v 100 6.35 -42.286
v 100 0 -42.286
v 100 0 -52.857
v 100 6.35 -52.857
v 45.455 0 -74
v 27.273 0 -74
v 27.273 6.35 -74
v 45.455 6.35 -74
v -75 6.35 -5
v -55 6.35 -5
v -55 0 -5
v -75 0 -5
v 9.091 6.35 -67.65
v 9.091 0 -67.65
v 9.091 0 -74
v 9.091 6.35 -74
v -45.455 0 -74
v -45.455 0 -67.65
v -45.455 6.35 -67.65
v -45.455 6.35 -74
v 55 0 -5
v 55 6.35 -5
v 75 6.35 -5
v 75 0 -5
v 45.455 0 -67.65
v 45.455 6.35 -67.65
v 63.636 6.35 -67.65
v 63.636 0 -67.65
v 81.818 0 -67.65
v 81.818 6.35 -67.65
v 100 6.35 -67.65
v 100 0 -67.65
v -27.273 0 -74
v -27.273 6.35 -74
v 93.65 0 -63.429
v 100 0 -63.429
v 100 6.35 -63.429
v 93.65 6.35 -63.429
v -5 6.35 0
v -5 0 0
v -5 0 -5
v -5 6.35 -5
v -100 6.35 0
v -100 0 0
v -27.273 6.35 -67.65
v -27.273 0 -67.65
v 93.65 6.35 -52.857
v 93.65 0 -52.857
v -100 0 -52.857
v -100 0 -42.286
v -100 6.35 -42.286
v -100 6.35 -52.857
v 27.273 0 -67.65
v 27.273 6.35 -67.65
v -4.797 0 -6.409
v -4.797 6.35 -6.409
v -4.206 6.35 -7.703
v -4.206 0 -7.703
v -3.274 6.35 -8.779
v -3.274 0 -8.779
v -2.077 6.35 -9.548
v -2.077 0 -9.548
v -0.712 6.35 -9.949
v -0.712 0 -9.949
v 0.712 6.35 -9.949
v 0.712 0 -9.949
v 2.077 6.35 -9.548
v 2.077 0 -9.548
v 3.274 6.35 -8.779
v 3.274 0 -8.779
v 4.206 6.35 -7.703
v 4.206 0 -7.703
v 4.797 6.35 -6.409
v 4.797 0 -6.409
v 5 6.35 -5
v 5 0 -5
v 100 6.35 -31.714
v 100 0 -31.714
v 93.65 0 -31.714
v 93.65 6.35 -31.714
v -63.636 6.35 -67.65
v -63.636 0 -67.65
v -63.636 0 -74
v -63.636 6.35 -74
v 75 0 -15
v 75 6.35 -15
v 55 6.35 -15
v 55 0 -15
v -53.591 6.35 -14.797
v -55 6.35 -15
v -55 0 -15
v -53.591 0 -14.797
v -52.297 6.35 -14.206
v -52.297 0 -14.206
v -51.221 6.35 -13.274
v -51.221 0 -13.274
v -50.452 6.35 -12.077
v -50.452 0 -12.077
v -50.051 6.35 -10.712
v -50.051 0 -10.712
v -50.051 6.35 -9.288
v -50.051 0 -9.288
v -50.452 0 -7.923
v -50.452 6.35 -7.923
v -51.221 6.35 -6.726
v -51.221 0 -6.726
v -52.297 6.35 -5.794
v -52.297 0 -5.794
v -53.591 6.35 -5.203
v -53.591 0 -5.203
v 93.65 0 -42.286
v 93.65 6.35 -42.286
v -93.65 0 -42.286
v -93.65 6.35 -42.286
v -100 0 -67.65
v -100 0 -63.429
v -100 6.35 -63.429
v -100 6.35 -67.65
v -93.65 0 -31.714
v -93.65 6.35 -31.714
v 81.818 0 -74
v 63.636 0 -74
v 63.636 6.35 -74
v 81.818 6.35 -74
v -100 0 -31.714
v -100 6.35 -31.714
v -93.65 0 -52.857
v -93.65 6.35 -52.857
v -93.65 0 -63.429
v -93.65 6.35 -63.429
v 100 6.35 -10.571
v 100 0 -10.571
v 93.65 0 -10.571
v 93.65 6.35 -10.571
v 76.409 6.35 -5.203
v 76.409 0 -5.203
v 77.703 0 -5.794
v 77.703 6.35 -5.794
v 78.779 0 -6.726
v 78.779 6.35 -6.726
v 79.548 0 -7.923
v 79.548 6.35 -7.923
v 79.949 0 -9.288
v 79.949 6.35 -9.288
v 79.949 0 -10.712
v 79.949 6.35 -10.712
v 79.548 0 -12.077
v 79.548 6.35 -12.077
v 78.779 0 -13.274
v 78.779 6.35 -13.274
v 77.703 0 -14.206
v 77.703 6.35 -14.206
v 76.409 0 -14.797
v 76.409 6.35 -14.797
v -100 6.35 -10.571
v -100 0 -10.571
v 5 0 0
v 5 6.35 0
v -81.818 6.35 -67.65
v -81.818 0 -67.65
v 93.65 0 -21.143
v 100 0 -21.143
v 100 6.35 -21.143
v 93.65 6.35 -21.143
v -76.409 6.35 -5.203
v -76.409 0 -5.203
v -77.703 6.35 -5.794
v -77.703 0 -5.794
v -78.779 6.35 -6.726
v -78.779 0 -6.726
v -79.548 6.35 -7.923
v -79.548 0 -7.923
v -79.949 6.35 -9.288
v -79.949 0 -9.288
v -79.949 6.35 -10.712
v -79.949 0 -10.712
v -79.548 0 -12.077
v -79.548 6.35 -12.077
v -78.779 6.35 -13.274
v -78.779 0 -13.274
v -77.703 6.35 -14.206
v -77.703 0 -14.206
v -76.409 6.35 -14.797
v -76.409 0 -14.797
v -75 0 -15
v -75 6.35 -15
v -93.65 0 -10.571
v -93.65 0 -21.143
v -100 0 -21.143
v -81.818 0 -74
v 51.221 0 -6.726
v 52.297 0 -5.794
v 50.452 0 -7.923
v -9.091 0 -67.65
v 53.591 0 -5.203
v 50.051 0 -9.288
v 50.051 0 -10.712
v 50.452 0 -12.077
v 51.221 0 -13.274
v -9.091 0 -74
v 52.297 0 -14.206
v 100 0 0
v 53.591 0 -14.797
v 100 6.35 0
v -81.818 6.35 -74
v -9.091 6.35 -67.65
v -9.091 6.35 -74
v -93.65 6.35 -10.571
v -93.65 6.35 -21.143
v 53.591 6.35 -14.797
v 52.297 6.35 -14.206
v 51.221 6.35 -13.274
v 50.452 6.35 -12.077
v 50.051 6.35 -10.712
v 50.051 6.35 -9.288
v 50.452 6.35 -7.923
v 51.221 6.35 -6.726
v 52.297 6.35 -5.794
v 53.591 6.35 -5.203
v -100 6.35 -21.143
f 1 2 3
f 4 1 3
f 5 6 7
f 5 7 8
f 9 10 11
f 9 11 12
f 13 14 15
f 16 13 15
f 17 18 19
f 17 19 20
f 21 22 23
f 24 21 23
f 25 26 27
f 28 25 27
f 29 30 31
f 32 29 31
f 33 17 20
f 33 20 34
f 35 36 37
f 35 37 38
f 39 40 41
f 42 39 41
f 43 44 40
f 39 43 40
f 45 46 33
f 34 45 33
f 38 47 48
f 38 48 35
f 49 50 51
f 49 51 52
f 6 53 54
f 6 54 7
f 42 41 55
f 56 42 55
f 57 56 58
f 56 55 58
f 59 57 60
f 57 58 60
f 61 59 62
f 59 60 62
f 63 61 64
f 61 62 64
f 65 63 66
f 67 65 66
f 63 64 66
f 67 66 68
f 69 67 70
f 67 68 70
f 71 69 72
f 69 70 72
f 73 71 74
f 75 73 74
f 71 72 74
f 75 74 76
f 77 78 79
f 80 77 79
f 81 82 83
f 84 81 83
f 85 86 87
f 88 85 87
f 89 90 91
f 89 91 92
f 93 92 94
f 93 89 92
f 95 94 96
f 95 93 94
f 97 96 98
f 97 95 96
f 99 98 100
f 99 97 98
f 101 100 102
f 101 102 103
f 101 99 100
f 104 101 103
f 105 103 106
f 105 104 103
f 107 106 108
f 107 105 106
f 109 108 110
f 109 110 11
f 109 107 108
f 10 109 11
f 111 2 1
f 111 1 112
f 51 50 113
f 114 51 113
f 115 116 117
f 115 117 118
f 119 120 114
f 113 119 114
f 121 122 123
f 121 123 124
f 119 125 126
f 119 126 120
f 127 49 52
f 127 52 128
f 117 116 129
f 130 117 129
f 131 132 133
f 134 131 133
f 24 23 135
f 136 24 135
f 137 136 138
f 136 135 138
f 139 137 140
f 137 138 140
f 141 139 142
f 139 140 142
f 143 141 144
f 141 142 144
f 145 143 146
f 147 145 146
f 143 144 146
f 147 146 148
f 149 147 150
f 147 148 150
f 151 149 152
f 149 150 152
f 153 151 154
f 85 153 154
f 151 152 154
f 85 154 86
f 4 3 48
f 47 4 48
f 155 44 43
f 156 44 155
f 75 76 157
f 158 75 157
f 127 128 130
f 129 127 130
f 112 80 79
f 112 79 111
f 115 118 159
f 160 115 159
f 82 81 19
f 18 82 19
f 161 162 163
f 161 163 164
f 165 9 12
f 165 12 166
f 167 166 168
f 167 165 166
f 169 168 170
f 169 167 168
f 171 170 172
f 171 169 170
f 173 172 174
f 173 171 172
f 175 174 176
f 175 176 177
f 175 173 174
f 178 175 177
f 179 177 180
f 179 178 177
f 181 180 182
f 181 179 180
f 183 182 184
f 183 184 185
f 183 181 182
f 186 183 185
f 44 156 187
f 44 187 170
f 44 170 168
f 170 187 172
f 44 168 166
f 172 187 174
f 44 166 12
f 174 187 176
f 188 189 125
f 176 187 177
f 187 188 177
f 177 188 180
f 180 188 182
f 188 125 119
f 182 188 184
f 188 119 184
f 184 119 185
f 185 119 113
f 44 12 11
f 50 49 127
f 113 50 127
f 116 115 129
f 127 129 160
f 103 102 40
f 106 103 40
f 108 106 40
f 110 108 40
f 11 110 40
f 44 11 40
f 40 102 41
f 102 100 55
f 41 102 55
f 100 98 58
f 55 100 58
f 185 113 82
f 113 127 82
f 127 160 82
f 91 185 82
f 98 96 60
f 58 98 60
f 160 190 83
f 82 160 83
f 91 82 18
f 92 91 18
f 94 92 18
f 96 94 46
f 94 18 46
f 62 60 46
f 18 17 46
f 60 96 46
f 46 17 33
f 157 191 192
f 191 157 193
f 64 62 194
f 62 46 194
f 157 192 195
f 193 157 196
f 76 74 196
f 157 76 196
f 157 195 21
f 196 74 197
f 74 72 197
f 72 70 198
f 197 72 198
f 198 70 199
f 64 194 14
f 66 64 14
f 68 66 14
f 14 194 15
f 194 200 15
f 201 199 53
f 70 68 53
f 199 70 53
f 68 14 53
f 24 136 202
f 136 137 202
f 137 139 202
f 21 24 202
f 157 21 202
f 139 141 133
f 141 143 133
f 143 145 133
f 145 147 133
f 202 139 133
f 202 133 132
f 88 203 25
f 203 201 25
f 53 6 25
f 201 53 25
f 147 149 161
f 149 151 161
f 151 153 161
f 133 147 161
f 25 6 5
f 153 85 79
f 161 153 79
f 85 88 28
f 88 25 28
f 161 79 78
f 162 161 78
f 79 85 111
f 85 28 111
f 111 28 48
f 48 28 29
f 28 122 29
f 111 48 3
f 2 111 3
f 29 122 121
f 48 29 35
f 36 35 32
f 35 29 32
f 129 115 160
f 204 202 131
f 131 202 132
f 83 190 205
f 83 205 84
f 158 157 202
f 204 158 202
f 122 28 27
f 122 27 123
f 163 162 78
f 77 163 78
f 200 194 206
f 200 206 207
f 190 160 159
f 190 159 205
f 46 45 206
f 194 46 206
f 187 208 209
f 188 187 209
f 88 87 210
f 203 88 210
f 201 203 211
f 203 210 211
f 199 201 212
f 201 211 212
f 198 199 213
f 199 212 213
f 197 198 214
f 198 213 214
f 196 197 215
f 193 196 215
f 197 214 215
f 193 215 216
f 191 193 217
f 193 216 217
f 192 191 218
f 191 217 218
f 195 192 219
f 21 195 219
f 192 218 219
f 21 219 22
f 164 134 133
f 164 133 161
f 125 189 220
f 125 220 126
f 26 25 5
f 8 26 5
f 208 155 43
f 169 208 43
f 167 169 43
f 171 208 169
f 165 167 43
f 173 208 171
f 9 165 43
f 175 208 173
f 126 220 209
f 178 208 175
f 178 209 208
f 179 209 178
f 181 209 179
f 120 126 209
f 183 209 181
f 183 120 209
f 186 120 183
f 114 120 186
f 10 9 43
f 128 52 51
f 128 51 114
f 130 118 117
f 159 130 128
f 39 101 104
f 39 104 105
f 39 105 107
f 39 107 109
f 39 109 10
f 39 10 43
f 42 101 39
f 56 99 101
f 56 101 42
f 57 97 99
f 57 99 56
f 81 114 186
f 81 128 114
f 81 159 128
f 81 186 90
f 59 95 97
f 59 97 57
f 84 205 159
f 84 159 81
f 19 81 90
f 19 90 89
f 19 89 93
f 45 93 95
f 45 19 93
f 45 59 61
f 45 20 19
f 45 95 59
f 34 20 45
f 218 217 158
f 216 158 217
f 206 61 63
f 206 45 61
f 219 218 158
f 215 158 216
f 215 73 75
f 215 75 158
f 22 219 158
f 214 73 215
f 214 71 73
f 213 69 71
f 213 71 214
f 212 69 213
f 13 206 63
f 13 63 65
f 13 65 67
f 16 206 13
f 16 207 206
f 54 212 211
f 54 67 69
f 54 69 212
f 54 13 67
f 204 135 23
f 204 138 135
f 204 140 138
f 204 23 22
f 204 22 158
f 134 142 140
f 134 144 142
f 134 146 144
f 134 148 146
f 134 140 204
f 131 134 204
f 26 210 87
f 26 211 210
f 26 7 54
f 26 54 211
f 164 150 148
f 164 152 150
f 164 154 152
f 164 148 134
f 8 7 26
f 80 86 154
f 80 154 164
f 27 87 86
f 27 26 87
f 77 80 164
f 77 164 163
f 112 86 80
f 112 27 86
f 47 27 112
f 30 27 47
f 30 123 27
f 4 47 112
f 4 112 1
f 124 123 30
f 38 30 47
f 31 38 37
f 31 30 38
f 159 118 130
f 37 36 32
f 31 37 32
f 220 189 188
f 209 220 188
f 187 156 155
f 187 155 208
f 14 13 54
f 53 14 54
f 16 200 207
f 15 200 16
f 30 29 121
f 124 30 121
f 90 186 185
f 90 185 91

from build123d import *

# Parameters (mm, degrees)
ESQUISSE1_W             = 200
ESQUISSE1_H             = 74
BOSS_EXTRU_1_DEPTH      = 6.35
ESQUISSE3_W             = 6.35
ESQUISSE3_H             = 10.571428572
ENL_V_MAT_EXTRU_1_DEPTH = 6.35
ESQUISSE4_W             = 18.181818182
ESQUISSE4_H             = 6.35
ESQUISSE4_W_2           = 18.181818181
ENL_V_MAT_EXTRU_2_DEPTH = 6.35
ENL_V_MAT_EXTRU_3_DEPTH = 6.35
ENL_V_MAT_EXTRU_4_DEPTH = 6.35


with BuildPart() as part:
    # Esquisse1 → Boss.-Extru.1 (new body)
    with BuildSketch(Plane(origin=(0, 0, 0), x_dir=(1, 0, 0), z_dir=(0, 1, 0))):
        with Locations((0, 37)):
            Rectangle(ESQUISSE1_W, ESQUISSE1_H)
    extrude(amount=BOSS_EXTRU_1_DEPTH)

    # Esquisse3 → Enlèv. mat.-Extru.1 (cut)
    with BuildSketch(Plane(origin=(0, 6.35, 0), x_dir=(1, 0, 0), z_dir=(0, 1, 0))):
        with Locations((-96.825, 15.857142857)):
            Rectangle(ESQUISSE3_W, ESQUISSE3_H)
        with Locations((-96.825, 37)):
            Rectangle(ESQUISSE3_W, ESQUISSE3_H)
        with Locations((-96.825, 58.142857143)):
            Rectangle(ESQUISSE3_W, ESQUISSE3_H)
    enl_v_mat_extru_1 = extrude(amount=-ENL_V_MAT_EXTRU_1_DEPTH, mode=Mode.SUBTRACT)

    # Symétrie1: Enlèv. mat.-Extru.1 across plane
    add(enl_v_mat_extru_1.mirror(Plane(origin=(0, 0, 0), x_dir=(0, 0, 1), z_dir=(1, 0, 0))), mode=Mode.SUBTRACT)

    # Esquisse4 → Enlèv. mat.-Extru.2 (cut)
    with BuildSketch(Plane(origin=(0, 6.35, 0), x_dir=(1, 0, 0), z_dir=(0, 1, 0))):
        with Locations((-90.909090909, 70.825)):
            Rectangle(ESQUISSE4_W, ESQUISSE4_H)
        with Locations((-54.545454546, 70.825)):
            Rectangle(ESQUISSE4_W_2, ESQUISSE4_H)
        with Locations((-18.181818182, 70.825)):
            Rectangle(ESQUISSE4_W, ESQUISSE4_H)
        with Locations((18.181818182, 70.825)):
            Rectangle(ESQUISSE4_W, ESQUISSE4_H)
        with Locations((54.545454546, 70.825)):
            Rectangle(ESQUISSE4_W_2, ESQUISSE4_H)
        with Locations((90.909090909, 70.825)):
            Rectangle(ESQUISSE4_W, ESQUISSE4_H)
    extrude(amount=-ENL_V_MAT_EXTRU_2_DEPTH, mode=Mode.SUBTRACT)

    # Esquisse5 → Enlèv. mat.-Extru.3 (cut)
    with BuildSketch(Plane(origin=(0, 6.35, 0), x_dir=(1, 0, 0), z_dir=(0, 1, 0))):
        with BuildLine():
            Line((-75, 15), (-55, 15))
            ThreePointArc((-55, 15), (-50, 10), (-55, 5))
            Line((-55, 5), (-75, 5))
            ThreePointArc((-75, 5), (-80, 10), (-75, 15))
        make_face()
    enl_v_mat_extru_3 = extrude(amount=-ENL_V_MAT_EXTRU_3_DEPTH, mode=Mode.SUBTRACT)

    # Symétrie2: Enlèv. mat.-Extru.3 across plane
    add(enl_v_mat_extru_3.mirror(Plane(origin=(0, 0, 0), x_dir=(0, 0, 1), z_dir=(1, 0, 0))), mode=Mode.SUBTRACT)

    # Esquisse6 → Enlèv. mat.-Extru.4 (cut)
    with BuildSketch(Plane.XZ):
        with BuildLine():
            Line((-5, 0), (-5, -5))
            ThreePointArc((-5, -5), (0, -10), (5, -5))
            Line((5, -5), (5, 0))
            Line((5, 0), (-5, 0))
        make_face()
    extrude(amount=-ENL_V_MAT_EXTRU_4_DEPTH, mode=Mode.SUBTRACT)


solid = part.part
